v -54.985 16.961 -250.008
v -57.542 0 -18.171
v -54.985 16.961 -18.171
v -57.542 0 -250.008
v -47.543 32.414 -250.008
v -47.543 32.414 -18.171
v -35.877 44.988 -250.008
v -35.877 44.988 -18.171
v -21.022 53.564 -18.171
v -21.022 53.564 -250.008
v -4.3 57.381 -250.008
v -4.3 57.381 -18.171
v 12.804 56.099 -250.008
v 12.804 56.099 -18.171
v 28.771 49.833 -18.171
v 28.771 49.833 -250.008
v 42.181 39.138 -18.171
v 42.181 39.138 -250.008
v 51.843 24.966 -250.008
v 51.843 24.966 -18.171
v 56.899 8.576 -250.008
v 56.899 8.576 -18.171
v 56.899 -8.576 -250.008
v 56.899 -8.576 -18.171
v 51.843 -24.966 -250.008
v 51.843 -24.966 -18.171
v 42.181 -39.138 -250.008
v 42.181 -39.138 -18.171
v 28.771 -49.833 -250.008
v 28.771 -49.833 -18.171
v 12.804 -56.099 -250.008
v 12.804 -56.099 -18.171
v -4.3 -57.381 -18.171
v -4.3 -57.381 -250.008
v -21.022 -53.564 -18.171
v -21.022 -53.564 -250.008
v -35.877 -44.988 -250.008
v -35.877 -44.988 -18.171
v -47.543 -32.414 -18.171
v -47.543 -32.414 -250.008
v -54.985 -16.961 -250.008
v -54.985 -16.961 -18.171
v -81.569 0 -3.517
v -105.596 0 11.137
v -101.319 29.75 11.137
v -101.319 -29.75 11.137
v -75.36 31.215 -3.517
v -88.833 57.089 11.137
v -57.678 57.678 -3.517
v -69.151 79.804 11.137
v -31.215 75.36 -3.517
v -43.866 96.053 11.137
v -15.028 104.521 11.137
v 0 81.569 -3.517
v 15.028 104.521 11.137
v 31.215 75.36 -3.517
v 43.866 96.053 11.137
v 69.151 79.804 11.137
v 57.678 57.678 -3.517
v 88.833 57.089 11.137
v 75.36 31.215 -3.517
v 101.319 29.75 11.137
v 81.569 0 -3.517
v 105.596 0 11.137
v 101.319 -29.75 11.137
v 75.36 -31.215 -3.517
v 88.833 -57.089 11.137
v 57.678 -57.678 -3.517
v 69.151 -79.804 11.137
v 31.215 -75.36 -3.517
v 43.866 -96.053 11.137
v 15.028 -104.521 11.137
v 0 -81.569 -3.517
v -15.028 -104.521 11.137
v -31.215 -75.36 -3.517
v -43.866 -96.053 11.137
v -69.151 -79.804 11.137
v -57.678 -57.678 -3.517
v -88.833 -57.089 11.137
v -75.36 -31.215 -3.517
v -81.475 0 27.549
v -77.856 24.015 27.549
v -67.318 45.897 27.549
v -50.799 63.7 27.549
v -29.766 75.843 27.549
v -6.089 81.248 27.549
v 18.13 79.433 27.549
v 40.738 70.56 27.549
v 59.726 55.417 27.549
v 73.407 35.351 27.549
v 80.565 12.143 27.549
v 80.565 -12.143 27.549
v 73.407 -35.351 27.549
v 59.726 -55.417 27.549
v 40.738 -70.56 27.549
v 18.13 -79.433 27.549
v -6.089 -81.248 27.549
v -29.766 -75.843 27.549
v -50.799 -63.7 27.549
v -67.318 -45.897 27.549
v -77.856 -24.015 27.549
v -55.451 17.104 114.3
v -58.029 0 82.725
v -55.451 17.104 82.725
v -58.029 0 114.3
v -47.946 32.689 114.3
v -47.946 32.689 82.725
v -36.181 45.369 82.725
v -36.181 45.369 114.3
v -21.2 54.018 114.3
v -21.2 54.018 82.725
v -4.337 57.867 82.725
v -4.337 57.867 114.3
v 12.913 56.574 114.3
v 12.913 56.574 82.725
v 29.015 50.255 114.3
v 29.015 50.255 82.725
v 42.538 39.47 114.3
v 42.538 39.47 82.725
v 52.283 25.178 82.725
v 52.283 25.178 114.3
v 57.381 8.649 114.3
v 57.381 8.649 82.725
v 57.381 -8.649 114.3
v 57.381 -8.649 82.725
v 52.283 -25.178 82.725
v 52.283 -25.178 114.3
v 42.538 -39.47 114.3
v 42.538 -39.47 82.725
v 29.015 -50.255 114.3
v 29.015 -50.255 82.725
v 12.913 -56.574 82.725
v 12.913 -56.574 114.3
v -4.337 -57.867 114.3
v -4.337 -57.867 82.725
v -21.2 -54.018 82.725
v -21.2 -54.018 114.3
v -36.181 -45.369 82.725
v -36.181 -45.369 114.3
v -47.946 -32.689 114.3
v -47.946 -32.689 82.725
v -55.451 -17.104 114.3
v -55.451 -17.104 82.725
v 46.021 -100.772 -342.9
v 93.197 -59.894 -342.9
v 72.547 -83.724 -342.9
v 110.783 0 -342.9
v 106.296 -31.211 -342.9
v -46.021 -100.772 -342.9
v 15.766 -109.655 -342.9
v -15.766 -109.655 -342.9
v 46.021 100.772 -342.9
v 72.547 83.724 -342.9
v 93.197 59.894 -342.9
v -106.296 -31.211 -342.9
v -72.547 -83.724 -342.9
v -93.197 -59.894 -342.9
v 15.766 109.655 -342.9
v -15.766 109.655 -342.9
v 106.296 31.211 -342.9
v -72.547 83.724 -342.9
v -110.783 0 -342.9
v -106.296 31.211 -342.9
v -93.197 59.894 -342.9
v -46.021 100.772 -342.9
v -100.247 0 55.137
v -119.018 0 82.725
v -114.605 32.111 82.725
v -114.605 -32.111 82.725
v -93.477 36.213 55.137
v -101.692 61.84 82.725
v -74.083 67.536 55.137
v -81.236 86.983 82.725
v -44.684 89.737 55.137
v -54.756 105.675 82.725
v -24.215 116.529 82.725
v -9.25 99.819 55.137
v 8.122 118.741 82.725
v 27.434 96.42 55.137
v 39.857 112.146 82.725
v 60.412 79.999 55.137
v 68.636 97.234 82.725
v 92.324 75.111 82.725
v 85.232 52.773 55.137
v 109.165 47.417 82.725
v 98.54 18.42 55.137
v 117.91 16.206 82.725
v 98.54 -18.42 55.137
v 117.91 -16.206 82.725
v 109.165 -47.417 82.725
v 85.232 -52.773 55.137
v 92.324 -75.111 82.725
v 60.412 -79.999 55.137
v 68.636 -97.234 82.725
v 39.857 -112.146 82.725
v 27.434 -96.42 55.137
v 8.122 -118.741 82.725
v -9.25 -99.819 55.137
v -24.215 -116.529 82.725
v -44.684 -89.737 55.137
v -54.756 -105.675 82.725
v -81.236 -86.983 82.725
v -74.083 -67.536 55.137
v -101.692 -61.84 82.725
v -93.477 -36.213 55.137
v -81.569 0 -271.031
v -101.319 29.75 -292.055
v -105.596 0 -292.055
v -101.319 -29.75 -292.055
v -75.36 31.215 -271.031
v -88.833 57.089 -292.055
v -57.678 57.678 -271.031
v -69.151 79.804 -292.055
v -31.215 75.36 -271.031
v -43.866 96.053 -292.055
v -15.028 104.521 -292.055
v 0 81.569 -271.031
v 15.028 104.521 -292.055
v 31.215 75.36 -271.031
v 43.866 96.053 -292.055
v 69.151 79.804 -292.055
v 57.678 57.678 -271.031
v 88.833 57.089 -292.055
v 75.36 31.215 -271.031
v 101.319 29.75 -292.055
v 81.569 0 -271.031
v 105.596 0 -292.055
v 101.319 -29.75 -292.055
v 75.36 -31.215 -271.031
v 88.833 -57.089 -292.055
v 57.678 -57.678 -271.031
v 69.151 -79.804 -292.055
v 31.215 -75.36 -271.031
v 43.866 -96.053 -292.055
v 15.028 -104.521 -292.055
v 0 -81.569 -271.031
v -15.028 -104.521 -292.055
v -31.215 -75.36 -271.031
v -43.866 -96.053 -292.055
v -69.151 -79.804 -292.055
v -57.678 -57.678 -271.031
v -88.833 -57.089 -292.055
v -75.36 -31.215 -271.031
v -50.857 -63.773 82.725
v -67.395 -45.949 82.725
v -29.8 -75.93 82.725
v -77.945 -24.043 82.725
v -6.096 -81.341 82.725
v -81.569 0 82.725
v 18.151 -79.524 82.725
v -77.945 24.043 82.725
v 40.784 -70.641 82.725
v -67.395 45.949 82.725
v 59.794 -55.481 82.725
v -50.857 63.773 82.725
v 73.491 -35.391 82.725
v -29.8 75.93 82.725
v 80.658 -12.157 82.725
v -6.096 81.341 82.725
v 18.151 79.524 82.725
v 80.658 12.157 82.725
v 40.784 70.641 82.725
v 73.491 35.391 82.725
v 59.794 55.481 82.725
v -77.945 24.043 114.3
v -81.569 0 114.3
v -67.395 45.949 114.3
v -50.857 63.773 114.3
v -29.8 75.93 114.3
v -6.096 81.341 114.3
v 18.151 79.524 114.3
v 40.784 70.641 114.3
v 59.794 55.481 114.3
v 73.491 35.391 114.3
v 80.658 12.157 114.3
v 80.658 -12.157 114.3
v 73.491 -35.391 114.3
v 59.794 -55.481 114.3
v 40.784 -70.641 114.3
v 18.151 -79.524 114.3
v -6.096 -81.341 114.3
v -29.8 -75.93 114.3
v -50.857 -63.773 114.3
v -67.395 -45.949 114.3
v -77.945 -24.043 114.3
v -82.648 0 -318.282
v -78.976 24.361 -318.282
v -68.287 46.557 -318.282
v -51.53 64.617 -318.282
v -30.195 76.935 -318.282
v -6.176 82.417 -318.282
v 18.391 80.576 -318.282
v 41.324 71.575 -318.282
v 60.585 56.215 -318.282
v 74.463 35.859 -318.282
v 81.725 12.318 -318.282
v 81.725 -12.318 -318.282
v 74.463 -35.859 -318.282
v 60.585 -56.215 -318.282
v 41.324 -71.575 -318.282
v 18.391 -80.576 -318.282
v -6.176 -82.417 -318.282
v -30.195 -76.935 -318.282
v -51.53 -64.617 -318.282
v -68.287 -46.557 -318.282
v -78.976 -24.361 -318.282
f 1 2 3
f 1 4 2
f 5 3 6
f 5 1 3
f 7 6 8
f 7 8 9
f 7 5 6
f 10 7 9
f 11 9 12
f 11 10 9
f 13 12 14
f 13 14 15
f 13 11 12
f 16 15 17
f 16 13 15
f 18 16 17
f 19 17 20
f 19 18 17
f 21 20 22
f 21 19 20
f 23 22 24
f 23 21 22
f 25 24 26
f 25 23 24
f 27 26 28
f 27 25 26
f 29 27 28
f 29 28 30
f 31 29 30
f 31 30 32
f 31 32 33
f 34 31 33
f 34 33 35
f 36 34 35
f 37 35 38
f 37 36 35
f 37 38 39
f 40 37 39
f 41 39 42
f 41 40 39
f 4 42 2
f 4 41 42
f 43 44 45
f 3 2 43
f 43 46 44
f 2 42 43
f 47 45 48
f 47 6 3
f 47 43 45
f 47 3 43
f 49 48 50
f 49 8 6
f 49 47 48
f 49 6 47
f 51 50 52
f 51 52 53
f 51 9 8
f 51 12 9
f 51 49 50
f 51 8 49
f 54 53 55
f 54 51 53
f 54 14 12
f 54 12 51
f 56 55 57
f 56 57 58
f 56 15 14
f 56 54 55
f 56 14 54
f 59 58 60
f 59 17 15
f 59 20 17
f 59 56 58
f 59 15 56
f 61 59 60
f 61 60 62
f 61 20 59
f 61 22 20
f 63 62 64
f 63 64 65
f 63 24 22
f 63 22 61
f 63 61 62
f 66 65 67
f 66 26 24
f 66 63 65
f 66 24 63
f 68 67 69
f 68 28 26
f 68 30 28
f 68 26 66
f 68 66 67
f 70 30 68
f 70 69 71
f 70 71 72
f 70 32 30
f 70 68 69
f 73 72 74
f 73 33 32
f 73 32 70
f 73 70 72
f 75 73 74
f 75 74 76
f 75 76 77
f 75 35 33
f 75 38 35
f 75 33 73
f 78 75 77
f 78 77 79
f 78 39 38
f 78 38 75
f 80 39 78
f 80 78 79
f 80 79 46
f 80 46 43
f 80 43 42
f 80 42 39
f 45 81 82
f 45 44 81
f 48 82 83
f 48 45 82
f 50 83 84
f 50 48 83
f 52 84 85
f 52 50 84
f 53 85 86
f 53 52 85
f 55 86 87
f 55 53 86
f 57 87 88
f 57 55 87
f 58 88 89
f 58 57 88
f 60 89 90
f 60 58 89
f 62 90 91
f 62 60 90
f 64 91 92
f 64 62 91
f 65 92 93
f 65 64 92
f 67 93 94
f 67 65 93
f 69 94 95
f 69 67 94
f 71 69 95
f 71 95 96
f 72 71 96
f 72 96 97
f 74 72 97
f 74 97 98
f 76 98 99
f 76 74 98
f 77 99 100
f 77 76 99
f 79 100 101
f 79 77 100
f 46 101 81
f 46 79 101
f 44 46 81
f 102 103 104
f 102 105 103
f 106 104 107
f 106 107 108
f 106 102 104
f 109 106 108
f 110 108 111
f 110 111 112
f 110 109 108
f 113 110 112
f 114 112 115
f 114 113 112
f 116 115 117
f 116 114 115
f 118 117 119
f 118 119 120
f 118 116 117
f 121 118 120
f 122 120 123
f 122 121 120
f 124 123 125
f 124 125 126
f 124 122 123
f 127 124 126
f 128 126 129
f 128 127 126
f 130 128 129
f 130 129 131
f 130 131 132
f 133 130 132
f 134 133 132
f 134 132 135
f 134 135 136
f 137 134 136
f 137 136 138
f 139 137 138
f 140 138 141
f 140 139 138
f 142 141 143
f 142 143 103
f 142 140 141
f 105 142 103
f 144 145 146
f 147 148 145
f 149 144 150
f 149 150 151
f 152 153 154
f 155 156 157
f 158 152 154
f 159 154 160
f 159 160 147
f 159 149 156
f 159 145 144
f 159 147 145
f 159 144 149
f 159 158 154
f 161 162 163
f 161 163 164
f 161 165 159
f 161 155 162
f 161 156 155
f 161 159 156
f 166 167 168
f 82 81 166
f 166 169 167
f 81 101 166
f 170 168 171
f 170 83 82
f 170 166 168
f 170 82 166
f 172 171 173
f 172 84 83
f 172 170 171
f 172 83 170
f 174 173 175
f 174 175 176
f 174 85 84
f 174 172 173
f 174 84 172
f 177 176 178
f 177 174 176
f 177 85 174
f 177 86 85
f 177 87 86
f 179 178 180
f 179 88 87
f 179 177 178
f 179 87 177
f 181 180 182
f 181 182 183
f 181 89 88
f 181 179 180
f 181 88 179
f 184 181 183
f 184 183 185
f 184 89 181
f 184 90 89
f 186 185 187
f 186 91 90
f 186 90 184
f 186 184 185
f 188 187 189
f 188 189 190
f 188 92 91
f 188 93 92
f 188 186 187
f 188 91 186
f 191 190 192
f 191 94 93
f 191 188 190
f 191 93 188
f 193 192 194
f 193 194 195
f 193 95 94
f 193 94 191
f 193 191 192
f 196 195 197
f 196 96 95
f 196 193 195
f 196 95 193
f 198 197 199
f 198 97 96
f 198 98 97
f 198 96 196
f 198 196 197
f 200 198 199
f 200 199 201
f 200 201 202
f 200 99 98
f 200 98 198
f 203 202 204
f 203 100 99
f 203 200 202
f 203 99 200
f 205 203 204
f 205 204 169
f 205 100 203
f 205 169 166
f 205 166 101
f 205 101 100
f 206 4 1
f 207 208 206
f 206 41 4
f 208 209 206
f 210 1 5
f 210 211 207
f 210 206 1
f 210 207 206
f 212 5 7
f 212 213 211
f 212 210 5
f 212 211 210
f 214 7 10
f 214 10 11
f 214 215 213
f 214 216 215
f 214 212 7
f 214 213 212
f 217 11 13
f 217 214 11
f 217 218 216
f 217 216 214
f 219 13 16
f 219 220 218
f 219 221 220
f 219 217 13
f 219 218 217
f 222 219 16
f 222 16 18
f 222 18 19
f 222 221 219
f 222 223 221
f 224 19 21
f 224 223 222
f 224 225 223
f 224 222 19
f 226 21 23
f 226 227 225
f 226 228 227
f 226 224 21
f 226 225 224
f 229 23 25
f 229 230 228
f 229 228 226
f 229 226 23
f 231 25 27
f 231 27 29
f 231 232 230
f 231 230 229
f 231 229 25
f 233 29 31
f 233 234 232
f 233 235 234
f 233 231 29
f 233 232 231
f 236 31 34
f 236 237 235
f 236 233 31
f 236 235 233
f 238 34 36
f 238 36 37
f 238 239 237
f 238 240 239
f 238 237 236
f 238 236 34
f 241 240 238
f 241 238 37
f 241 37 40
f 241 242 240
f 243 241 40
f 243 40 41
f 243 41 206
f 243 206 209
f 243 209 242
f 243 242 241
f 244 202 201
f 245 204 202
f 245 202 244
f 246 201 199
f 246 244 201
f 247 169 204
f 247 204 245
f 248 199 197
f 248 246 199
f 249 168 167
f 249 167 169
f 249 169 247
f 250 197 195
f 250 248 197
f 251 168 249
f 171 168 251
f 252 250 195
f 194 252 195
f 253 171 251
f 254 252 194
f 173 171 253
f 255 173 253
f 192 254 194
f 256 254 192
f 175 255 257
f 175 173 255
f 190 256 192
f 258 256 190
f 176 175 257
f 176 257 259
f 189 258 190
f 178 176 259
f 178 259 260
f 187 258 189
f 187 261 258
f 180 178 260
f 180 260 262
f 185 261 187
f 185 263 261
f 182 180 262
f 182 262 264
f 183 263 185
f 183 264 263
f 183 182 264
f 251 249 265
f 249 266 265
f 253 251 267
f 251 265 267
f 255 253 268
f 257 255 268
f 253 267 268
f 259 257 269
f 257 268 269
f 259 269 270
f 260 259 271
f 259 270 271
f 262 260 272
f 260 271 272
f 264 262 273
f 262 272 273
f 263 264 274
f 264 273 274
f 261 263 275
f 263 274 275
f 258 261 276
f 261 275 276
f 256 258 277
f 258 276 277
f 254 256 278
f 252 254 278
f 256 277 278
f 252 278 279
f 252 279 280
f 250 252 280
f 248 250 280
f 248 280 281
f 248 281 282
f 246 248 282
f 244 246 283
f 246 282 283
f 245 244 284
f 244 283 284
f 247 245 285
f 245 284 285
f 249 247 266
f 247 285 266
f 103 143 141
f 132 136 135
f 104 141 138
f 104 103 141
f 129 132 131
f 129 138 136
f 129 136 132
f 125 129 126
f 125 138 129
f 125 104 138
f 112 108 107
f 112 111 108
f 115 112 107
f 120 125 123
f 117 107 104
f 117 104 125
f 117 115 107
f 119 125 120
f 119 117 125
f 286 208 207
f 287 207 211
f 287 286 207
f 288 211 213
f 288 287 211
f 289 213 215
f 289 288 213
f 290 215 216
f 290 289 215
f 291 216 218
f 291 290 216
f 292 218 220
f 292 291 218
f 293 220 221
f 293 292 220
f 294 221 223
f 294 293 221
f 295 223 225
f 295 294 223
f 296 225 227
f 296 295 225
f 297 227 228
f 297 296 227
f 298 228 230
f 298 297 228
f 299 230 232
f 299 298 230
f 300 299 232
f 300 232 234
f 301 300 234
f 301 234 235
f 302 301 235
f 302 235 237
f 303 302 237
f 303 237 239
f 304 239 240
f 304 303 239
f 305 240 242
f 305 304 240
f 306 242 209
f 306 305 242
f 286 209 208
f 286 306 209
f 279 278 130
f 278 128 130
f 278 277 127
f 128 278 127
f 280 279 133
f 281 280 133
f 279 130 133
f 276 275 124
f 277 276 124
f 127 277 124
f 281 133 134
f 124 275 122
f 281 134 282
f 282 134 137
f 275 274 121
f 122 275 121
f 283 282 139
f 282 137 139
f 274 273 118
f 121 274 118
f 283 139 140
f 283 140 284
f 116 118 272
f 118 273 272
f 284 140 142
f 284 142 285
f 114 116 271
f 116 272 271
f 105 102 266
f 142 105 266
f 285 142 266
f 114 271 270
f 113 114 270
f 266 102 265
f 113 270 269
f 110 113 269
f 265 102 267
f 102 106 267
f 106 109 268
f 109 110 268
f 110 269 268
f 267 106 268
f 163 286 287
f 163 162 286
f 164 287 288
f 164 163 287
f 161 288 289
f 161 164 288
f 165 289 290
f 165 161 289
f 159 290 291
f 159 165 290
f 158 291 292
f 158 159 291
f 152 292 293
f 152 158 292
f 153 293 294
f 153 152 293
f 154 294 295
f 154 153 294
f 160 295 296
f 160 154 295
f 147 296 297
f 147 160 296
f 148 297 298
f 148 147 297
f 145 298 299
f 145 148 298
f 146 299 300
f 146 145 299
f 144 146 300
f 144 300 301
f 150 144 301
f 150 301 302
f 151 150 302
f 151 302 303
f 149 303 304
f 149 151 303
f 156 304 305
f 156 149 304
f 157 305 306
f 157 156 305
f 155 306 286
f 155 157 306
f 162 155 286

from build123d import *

# Parameters (mm, degrees)
F0_W = 23.53953
F0_H = 31.575338


with BuildPart() as f1:
    # F0 (on Front) → F1 (revolve)
    with BuildSketch(Plane.XZ):
        Polygon((0, -342.900006), (0, 82.724656), (-58.029232, 82.724656), (-81.568762, 82.724656), (-119.018393, 82.724656), (-81.475385, 27.549231), (-105.595883, 11.136923), (-57.541642, -18.170769), (-57.541642, -250.007569), (-105.595883, -292.055042), (-82.647693, -318.281537), (-110.783078, -342.900006), align=None)
        with Locations((-69.798997, 98.512325)):
            Rectangle(F0_W, F0_H)
    revolve(axis=Axis((0, 0, -1.758462), (0, 0, -1)))


solid = f1.part
